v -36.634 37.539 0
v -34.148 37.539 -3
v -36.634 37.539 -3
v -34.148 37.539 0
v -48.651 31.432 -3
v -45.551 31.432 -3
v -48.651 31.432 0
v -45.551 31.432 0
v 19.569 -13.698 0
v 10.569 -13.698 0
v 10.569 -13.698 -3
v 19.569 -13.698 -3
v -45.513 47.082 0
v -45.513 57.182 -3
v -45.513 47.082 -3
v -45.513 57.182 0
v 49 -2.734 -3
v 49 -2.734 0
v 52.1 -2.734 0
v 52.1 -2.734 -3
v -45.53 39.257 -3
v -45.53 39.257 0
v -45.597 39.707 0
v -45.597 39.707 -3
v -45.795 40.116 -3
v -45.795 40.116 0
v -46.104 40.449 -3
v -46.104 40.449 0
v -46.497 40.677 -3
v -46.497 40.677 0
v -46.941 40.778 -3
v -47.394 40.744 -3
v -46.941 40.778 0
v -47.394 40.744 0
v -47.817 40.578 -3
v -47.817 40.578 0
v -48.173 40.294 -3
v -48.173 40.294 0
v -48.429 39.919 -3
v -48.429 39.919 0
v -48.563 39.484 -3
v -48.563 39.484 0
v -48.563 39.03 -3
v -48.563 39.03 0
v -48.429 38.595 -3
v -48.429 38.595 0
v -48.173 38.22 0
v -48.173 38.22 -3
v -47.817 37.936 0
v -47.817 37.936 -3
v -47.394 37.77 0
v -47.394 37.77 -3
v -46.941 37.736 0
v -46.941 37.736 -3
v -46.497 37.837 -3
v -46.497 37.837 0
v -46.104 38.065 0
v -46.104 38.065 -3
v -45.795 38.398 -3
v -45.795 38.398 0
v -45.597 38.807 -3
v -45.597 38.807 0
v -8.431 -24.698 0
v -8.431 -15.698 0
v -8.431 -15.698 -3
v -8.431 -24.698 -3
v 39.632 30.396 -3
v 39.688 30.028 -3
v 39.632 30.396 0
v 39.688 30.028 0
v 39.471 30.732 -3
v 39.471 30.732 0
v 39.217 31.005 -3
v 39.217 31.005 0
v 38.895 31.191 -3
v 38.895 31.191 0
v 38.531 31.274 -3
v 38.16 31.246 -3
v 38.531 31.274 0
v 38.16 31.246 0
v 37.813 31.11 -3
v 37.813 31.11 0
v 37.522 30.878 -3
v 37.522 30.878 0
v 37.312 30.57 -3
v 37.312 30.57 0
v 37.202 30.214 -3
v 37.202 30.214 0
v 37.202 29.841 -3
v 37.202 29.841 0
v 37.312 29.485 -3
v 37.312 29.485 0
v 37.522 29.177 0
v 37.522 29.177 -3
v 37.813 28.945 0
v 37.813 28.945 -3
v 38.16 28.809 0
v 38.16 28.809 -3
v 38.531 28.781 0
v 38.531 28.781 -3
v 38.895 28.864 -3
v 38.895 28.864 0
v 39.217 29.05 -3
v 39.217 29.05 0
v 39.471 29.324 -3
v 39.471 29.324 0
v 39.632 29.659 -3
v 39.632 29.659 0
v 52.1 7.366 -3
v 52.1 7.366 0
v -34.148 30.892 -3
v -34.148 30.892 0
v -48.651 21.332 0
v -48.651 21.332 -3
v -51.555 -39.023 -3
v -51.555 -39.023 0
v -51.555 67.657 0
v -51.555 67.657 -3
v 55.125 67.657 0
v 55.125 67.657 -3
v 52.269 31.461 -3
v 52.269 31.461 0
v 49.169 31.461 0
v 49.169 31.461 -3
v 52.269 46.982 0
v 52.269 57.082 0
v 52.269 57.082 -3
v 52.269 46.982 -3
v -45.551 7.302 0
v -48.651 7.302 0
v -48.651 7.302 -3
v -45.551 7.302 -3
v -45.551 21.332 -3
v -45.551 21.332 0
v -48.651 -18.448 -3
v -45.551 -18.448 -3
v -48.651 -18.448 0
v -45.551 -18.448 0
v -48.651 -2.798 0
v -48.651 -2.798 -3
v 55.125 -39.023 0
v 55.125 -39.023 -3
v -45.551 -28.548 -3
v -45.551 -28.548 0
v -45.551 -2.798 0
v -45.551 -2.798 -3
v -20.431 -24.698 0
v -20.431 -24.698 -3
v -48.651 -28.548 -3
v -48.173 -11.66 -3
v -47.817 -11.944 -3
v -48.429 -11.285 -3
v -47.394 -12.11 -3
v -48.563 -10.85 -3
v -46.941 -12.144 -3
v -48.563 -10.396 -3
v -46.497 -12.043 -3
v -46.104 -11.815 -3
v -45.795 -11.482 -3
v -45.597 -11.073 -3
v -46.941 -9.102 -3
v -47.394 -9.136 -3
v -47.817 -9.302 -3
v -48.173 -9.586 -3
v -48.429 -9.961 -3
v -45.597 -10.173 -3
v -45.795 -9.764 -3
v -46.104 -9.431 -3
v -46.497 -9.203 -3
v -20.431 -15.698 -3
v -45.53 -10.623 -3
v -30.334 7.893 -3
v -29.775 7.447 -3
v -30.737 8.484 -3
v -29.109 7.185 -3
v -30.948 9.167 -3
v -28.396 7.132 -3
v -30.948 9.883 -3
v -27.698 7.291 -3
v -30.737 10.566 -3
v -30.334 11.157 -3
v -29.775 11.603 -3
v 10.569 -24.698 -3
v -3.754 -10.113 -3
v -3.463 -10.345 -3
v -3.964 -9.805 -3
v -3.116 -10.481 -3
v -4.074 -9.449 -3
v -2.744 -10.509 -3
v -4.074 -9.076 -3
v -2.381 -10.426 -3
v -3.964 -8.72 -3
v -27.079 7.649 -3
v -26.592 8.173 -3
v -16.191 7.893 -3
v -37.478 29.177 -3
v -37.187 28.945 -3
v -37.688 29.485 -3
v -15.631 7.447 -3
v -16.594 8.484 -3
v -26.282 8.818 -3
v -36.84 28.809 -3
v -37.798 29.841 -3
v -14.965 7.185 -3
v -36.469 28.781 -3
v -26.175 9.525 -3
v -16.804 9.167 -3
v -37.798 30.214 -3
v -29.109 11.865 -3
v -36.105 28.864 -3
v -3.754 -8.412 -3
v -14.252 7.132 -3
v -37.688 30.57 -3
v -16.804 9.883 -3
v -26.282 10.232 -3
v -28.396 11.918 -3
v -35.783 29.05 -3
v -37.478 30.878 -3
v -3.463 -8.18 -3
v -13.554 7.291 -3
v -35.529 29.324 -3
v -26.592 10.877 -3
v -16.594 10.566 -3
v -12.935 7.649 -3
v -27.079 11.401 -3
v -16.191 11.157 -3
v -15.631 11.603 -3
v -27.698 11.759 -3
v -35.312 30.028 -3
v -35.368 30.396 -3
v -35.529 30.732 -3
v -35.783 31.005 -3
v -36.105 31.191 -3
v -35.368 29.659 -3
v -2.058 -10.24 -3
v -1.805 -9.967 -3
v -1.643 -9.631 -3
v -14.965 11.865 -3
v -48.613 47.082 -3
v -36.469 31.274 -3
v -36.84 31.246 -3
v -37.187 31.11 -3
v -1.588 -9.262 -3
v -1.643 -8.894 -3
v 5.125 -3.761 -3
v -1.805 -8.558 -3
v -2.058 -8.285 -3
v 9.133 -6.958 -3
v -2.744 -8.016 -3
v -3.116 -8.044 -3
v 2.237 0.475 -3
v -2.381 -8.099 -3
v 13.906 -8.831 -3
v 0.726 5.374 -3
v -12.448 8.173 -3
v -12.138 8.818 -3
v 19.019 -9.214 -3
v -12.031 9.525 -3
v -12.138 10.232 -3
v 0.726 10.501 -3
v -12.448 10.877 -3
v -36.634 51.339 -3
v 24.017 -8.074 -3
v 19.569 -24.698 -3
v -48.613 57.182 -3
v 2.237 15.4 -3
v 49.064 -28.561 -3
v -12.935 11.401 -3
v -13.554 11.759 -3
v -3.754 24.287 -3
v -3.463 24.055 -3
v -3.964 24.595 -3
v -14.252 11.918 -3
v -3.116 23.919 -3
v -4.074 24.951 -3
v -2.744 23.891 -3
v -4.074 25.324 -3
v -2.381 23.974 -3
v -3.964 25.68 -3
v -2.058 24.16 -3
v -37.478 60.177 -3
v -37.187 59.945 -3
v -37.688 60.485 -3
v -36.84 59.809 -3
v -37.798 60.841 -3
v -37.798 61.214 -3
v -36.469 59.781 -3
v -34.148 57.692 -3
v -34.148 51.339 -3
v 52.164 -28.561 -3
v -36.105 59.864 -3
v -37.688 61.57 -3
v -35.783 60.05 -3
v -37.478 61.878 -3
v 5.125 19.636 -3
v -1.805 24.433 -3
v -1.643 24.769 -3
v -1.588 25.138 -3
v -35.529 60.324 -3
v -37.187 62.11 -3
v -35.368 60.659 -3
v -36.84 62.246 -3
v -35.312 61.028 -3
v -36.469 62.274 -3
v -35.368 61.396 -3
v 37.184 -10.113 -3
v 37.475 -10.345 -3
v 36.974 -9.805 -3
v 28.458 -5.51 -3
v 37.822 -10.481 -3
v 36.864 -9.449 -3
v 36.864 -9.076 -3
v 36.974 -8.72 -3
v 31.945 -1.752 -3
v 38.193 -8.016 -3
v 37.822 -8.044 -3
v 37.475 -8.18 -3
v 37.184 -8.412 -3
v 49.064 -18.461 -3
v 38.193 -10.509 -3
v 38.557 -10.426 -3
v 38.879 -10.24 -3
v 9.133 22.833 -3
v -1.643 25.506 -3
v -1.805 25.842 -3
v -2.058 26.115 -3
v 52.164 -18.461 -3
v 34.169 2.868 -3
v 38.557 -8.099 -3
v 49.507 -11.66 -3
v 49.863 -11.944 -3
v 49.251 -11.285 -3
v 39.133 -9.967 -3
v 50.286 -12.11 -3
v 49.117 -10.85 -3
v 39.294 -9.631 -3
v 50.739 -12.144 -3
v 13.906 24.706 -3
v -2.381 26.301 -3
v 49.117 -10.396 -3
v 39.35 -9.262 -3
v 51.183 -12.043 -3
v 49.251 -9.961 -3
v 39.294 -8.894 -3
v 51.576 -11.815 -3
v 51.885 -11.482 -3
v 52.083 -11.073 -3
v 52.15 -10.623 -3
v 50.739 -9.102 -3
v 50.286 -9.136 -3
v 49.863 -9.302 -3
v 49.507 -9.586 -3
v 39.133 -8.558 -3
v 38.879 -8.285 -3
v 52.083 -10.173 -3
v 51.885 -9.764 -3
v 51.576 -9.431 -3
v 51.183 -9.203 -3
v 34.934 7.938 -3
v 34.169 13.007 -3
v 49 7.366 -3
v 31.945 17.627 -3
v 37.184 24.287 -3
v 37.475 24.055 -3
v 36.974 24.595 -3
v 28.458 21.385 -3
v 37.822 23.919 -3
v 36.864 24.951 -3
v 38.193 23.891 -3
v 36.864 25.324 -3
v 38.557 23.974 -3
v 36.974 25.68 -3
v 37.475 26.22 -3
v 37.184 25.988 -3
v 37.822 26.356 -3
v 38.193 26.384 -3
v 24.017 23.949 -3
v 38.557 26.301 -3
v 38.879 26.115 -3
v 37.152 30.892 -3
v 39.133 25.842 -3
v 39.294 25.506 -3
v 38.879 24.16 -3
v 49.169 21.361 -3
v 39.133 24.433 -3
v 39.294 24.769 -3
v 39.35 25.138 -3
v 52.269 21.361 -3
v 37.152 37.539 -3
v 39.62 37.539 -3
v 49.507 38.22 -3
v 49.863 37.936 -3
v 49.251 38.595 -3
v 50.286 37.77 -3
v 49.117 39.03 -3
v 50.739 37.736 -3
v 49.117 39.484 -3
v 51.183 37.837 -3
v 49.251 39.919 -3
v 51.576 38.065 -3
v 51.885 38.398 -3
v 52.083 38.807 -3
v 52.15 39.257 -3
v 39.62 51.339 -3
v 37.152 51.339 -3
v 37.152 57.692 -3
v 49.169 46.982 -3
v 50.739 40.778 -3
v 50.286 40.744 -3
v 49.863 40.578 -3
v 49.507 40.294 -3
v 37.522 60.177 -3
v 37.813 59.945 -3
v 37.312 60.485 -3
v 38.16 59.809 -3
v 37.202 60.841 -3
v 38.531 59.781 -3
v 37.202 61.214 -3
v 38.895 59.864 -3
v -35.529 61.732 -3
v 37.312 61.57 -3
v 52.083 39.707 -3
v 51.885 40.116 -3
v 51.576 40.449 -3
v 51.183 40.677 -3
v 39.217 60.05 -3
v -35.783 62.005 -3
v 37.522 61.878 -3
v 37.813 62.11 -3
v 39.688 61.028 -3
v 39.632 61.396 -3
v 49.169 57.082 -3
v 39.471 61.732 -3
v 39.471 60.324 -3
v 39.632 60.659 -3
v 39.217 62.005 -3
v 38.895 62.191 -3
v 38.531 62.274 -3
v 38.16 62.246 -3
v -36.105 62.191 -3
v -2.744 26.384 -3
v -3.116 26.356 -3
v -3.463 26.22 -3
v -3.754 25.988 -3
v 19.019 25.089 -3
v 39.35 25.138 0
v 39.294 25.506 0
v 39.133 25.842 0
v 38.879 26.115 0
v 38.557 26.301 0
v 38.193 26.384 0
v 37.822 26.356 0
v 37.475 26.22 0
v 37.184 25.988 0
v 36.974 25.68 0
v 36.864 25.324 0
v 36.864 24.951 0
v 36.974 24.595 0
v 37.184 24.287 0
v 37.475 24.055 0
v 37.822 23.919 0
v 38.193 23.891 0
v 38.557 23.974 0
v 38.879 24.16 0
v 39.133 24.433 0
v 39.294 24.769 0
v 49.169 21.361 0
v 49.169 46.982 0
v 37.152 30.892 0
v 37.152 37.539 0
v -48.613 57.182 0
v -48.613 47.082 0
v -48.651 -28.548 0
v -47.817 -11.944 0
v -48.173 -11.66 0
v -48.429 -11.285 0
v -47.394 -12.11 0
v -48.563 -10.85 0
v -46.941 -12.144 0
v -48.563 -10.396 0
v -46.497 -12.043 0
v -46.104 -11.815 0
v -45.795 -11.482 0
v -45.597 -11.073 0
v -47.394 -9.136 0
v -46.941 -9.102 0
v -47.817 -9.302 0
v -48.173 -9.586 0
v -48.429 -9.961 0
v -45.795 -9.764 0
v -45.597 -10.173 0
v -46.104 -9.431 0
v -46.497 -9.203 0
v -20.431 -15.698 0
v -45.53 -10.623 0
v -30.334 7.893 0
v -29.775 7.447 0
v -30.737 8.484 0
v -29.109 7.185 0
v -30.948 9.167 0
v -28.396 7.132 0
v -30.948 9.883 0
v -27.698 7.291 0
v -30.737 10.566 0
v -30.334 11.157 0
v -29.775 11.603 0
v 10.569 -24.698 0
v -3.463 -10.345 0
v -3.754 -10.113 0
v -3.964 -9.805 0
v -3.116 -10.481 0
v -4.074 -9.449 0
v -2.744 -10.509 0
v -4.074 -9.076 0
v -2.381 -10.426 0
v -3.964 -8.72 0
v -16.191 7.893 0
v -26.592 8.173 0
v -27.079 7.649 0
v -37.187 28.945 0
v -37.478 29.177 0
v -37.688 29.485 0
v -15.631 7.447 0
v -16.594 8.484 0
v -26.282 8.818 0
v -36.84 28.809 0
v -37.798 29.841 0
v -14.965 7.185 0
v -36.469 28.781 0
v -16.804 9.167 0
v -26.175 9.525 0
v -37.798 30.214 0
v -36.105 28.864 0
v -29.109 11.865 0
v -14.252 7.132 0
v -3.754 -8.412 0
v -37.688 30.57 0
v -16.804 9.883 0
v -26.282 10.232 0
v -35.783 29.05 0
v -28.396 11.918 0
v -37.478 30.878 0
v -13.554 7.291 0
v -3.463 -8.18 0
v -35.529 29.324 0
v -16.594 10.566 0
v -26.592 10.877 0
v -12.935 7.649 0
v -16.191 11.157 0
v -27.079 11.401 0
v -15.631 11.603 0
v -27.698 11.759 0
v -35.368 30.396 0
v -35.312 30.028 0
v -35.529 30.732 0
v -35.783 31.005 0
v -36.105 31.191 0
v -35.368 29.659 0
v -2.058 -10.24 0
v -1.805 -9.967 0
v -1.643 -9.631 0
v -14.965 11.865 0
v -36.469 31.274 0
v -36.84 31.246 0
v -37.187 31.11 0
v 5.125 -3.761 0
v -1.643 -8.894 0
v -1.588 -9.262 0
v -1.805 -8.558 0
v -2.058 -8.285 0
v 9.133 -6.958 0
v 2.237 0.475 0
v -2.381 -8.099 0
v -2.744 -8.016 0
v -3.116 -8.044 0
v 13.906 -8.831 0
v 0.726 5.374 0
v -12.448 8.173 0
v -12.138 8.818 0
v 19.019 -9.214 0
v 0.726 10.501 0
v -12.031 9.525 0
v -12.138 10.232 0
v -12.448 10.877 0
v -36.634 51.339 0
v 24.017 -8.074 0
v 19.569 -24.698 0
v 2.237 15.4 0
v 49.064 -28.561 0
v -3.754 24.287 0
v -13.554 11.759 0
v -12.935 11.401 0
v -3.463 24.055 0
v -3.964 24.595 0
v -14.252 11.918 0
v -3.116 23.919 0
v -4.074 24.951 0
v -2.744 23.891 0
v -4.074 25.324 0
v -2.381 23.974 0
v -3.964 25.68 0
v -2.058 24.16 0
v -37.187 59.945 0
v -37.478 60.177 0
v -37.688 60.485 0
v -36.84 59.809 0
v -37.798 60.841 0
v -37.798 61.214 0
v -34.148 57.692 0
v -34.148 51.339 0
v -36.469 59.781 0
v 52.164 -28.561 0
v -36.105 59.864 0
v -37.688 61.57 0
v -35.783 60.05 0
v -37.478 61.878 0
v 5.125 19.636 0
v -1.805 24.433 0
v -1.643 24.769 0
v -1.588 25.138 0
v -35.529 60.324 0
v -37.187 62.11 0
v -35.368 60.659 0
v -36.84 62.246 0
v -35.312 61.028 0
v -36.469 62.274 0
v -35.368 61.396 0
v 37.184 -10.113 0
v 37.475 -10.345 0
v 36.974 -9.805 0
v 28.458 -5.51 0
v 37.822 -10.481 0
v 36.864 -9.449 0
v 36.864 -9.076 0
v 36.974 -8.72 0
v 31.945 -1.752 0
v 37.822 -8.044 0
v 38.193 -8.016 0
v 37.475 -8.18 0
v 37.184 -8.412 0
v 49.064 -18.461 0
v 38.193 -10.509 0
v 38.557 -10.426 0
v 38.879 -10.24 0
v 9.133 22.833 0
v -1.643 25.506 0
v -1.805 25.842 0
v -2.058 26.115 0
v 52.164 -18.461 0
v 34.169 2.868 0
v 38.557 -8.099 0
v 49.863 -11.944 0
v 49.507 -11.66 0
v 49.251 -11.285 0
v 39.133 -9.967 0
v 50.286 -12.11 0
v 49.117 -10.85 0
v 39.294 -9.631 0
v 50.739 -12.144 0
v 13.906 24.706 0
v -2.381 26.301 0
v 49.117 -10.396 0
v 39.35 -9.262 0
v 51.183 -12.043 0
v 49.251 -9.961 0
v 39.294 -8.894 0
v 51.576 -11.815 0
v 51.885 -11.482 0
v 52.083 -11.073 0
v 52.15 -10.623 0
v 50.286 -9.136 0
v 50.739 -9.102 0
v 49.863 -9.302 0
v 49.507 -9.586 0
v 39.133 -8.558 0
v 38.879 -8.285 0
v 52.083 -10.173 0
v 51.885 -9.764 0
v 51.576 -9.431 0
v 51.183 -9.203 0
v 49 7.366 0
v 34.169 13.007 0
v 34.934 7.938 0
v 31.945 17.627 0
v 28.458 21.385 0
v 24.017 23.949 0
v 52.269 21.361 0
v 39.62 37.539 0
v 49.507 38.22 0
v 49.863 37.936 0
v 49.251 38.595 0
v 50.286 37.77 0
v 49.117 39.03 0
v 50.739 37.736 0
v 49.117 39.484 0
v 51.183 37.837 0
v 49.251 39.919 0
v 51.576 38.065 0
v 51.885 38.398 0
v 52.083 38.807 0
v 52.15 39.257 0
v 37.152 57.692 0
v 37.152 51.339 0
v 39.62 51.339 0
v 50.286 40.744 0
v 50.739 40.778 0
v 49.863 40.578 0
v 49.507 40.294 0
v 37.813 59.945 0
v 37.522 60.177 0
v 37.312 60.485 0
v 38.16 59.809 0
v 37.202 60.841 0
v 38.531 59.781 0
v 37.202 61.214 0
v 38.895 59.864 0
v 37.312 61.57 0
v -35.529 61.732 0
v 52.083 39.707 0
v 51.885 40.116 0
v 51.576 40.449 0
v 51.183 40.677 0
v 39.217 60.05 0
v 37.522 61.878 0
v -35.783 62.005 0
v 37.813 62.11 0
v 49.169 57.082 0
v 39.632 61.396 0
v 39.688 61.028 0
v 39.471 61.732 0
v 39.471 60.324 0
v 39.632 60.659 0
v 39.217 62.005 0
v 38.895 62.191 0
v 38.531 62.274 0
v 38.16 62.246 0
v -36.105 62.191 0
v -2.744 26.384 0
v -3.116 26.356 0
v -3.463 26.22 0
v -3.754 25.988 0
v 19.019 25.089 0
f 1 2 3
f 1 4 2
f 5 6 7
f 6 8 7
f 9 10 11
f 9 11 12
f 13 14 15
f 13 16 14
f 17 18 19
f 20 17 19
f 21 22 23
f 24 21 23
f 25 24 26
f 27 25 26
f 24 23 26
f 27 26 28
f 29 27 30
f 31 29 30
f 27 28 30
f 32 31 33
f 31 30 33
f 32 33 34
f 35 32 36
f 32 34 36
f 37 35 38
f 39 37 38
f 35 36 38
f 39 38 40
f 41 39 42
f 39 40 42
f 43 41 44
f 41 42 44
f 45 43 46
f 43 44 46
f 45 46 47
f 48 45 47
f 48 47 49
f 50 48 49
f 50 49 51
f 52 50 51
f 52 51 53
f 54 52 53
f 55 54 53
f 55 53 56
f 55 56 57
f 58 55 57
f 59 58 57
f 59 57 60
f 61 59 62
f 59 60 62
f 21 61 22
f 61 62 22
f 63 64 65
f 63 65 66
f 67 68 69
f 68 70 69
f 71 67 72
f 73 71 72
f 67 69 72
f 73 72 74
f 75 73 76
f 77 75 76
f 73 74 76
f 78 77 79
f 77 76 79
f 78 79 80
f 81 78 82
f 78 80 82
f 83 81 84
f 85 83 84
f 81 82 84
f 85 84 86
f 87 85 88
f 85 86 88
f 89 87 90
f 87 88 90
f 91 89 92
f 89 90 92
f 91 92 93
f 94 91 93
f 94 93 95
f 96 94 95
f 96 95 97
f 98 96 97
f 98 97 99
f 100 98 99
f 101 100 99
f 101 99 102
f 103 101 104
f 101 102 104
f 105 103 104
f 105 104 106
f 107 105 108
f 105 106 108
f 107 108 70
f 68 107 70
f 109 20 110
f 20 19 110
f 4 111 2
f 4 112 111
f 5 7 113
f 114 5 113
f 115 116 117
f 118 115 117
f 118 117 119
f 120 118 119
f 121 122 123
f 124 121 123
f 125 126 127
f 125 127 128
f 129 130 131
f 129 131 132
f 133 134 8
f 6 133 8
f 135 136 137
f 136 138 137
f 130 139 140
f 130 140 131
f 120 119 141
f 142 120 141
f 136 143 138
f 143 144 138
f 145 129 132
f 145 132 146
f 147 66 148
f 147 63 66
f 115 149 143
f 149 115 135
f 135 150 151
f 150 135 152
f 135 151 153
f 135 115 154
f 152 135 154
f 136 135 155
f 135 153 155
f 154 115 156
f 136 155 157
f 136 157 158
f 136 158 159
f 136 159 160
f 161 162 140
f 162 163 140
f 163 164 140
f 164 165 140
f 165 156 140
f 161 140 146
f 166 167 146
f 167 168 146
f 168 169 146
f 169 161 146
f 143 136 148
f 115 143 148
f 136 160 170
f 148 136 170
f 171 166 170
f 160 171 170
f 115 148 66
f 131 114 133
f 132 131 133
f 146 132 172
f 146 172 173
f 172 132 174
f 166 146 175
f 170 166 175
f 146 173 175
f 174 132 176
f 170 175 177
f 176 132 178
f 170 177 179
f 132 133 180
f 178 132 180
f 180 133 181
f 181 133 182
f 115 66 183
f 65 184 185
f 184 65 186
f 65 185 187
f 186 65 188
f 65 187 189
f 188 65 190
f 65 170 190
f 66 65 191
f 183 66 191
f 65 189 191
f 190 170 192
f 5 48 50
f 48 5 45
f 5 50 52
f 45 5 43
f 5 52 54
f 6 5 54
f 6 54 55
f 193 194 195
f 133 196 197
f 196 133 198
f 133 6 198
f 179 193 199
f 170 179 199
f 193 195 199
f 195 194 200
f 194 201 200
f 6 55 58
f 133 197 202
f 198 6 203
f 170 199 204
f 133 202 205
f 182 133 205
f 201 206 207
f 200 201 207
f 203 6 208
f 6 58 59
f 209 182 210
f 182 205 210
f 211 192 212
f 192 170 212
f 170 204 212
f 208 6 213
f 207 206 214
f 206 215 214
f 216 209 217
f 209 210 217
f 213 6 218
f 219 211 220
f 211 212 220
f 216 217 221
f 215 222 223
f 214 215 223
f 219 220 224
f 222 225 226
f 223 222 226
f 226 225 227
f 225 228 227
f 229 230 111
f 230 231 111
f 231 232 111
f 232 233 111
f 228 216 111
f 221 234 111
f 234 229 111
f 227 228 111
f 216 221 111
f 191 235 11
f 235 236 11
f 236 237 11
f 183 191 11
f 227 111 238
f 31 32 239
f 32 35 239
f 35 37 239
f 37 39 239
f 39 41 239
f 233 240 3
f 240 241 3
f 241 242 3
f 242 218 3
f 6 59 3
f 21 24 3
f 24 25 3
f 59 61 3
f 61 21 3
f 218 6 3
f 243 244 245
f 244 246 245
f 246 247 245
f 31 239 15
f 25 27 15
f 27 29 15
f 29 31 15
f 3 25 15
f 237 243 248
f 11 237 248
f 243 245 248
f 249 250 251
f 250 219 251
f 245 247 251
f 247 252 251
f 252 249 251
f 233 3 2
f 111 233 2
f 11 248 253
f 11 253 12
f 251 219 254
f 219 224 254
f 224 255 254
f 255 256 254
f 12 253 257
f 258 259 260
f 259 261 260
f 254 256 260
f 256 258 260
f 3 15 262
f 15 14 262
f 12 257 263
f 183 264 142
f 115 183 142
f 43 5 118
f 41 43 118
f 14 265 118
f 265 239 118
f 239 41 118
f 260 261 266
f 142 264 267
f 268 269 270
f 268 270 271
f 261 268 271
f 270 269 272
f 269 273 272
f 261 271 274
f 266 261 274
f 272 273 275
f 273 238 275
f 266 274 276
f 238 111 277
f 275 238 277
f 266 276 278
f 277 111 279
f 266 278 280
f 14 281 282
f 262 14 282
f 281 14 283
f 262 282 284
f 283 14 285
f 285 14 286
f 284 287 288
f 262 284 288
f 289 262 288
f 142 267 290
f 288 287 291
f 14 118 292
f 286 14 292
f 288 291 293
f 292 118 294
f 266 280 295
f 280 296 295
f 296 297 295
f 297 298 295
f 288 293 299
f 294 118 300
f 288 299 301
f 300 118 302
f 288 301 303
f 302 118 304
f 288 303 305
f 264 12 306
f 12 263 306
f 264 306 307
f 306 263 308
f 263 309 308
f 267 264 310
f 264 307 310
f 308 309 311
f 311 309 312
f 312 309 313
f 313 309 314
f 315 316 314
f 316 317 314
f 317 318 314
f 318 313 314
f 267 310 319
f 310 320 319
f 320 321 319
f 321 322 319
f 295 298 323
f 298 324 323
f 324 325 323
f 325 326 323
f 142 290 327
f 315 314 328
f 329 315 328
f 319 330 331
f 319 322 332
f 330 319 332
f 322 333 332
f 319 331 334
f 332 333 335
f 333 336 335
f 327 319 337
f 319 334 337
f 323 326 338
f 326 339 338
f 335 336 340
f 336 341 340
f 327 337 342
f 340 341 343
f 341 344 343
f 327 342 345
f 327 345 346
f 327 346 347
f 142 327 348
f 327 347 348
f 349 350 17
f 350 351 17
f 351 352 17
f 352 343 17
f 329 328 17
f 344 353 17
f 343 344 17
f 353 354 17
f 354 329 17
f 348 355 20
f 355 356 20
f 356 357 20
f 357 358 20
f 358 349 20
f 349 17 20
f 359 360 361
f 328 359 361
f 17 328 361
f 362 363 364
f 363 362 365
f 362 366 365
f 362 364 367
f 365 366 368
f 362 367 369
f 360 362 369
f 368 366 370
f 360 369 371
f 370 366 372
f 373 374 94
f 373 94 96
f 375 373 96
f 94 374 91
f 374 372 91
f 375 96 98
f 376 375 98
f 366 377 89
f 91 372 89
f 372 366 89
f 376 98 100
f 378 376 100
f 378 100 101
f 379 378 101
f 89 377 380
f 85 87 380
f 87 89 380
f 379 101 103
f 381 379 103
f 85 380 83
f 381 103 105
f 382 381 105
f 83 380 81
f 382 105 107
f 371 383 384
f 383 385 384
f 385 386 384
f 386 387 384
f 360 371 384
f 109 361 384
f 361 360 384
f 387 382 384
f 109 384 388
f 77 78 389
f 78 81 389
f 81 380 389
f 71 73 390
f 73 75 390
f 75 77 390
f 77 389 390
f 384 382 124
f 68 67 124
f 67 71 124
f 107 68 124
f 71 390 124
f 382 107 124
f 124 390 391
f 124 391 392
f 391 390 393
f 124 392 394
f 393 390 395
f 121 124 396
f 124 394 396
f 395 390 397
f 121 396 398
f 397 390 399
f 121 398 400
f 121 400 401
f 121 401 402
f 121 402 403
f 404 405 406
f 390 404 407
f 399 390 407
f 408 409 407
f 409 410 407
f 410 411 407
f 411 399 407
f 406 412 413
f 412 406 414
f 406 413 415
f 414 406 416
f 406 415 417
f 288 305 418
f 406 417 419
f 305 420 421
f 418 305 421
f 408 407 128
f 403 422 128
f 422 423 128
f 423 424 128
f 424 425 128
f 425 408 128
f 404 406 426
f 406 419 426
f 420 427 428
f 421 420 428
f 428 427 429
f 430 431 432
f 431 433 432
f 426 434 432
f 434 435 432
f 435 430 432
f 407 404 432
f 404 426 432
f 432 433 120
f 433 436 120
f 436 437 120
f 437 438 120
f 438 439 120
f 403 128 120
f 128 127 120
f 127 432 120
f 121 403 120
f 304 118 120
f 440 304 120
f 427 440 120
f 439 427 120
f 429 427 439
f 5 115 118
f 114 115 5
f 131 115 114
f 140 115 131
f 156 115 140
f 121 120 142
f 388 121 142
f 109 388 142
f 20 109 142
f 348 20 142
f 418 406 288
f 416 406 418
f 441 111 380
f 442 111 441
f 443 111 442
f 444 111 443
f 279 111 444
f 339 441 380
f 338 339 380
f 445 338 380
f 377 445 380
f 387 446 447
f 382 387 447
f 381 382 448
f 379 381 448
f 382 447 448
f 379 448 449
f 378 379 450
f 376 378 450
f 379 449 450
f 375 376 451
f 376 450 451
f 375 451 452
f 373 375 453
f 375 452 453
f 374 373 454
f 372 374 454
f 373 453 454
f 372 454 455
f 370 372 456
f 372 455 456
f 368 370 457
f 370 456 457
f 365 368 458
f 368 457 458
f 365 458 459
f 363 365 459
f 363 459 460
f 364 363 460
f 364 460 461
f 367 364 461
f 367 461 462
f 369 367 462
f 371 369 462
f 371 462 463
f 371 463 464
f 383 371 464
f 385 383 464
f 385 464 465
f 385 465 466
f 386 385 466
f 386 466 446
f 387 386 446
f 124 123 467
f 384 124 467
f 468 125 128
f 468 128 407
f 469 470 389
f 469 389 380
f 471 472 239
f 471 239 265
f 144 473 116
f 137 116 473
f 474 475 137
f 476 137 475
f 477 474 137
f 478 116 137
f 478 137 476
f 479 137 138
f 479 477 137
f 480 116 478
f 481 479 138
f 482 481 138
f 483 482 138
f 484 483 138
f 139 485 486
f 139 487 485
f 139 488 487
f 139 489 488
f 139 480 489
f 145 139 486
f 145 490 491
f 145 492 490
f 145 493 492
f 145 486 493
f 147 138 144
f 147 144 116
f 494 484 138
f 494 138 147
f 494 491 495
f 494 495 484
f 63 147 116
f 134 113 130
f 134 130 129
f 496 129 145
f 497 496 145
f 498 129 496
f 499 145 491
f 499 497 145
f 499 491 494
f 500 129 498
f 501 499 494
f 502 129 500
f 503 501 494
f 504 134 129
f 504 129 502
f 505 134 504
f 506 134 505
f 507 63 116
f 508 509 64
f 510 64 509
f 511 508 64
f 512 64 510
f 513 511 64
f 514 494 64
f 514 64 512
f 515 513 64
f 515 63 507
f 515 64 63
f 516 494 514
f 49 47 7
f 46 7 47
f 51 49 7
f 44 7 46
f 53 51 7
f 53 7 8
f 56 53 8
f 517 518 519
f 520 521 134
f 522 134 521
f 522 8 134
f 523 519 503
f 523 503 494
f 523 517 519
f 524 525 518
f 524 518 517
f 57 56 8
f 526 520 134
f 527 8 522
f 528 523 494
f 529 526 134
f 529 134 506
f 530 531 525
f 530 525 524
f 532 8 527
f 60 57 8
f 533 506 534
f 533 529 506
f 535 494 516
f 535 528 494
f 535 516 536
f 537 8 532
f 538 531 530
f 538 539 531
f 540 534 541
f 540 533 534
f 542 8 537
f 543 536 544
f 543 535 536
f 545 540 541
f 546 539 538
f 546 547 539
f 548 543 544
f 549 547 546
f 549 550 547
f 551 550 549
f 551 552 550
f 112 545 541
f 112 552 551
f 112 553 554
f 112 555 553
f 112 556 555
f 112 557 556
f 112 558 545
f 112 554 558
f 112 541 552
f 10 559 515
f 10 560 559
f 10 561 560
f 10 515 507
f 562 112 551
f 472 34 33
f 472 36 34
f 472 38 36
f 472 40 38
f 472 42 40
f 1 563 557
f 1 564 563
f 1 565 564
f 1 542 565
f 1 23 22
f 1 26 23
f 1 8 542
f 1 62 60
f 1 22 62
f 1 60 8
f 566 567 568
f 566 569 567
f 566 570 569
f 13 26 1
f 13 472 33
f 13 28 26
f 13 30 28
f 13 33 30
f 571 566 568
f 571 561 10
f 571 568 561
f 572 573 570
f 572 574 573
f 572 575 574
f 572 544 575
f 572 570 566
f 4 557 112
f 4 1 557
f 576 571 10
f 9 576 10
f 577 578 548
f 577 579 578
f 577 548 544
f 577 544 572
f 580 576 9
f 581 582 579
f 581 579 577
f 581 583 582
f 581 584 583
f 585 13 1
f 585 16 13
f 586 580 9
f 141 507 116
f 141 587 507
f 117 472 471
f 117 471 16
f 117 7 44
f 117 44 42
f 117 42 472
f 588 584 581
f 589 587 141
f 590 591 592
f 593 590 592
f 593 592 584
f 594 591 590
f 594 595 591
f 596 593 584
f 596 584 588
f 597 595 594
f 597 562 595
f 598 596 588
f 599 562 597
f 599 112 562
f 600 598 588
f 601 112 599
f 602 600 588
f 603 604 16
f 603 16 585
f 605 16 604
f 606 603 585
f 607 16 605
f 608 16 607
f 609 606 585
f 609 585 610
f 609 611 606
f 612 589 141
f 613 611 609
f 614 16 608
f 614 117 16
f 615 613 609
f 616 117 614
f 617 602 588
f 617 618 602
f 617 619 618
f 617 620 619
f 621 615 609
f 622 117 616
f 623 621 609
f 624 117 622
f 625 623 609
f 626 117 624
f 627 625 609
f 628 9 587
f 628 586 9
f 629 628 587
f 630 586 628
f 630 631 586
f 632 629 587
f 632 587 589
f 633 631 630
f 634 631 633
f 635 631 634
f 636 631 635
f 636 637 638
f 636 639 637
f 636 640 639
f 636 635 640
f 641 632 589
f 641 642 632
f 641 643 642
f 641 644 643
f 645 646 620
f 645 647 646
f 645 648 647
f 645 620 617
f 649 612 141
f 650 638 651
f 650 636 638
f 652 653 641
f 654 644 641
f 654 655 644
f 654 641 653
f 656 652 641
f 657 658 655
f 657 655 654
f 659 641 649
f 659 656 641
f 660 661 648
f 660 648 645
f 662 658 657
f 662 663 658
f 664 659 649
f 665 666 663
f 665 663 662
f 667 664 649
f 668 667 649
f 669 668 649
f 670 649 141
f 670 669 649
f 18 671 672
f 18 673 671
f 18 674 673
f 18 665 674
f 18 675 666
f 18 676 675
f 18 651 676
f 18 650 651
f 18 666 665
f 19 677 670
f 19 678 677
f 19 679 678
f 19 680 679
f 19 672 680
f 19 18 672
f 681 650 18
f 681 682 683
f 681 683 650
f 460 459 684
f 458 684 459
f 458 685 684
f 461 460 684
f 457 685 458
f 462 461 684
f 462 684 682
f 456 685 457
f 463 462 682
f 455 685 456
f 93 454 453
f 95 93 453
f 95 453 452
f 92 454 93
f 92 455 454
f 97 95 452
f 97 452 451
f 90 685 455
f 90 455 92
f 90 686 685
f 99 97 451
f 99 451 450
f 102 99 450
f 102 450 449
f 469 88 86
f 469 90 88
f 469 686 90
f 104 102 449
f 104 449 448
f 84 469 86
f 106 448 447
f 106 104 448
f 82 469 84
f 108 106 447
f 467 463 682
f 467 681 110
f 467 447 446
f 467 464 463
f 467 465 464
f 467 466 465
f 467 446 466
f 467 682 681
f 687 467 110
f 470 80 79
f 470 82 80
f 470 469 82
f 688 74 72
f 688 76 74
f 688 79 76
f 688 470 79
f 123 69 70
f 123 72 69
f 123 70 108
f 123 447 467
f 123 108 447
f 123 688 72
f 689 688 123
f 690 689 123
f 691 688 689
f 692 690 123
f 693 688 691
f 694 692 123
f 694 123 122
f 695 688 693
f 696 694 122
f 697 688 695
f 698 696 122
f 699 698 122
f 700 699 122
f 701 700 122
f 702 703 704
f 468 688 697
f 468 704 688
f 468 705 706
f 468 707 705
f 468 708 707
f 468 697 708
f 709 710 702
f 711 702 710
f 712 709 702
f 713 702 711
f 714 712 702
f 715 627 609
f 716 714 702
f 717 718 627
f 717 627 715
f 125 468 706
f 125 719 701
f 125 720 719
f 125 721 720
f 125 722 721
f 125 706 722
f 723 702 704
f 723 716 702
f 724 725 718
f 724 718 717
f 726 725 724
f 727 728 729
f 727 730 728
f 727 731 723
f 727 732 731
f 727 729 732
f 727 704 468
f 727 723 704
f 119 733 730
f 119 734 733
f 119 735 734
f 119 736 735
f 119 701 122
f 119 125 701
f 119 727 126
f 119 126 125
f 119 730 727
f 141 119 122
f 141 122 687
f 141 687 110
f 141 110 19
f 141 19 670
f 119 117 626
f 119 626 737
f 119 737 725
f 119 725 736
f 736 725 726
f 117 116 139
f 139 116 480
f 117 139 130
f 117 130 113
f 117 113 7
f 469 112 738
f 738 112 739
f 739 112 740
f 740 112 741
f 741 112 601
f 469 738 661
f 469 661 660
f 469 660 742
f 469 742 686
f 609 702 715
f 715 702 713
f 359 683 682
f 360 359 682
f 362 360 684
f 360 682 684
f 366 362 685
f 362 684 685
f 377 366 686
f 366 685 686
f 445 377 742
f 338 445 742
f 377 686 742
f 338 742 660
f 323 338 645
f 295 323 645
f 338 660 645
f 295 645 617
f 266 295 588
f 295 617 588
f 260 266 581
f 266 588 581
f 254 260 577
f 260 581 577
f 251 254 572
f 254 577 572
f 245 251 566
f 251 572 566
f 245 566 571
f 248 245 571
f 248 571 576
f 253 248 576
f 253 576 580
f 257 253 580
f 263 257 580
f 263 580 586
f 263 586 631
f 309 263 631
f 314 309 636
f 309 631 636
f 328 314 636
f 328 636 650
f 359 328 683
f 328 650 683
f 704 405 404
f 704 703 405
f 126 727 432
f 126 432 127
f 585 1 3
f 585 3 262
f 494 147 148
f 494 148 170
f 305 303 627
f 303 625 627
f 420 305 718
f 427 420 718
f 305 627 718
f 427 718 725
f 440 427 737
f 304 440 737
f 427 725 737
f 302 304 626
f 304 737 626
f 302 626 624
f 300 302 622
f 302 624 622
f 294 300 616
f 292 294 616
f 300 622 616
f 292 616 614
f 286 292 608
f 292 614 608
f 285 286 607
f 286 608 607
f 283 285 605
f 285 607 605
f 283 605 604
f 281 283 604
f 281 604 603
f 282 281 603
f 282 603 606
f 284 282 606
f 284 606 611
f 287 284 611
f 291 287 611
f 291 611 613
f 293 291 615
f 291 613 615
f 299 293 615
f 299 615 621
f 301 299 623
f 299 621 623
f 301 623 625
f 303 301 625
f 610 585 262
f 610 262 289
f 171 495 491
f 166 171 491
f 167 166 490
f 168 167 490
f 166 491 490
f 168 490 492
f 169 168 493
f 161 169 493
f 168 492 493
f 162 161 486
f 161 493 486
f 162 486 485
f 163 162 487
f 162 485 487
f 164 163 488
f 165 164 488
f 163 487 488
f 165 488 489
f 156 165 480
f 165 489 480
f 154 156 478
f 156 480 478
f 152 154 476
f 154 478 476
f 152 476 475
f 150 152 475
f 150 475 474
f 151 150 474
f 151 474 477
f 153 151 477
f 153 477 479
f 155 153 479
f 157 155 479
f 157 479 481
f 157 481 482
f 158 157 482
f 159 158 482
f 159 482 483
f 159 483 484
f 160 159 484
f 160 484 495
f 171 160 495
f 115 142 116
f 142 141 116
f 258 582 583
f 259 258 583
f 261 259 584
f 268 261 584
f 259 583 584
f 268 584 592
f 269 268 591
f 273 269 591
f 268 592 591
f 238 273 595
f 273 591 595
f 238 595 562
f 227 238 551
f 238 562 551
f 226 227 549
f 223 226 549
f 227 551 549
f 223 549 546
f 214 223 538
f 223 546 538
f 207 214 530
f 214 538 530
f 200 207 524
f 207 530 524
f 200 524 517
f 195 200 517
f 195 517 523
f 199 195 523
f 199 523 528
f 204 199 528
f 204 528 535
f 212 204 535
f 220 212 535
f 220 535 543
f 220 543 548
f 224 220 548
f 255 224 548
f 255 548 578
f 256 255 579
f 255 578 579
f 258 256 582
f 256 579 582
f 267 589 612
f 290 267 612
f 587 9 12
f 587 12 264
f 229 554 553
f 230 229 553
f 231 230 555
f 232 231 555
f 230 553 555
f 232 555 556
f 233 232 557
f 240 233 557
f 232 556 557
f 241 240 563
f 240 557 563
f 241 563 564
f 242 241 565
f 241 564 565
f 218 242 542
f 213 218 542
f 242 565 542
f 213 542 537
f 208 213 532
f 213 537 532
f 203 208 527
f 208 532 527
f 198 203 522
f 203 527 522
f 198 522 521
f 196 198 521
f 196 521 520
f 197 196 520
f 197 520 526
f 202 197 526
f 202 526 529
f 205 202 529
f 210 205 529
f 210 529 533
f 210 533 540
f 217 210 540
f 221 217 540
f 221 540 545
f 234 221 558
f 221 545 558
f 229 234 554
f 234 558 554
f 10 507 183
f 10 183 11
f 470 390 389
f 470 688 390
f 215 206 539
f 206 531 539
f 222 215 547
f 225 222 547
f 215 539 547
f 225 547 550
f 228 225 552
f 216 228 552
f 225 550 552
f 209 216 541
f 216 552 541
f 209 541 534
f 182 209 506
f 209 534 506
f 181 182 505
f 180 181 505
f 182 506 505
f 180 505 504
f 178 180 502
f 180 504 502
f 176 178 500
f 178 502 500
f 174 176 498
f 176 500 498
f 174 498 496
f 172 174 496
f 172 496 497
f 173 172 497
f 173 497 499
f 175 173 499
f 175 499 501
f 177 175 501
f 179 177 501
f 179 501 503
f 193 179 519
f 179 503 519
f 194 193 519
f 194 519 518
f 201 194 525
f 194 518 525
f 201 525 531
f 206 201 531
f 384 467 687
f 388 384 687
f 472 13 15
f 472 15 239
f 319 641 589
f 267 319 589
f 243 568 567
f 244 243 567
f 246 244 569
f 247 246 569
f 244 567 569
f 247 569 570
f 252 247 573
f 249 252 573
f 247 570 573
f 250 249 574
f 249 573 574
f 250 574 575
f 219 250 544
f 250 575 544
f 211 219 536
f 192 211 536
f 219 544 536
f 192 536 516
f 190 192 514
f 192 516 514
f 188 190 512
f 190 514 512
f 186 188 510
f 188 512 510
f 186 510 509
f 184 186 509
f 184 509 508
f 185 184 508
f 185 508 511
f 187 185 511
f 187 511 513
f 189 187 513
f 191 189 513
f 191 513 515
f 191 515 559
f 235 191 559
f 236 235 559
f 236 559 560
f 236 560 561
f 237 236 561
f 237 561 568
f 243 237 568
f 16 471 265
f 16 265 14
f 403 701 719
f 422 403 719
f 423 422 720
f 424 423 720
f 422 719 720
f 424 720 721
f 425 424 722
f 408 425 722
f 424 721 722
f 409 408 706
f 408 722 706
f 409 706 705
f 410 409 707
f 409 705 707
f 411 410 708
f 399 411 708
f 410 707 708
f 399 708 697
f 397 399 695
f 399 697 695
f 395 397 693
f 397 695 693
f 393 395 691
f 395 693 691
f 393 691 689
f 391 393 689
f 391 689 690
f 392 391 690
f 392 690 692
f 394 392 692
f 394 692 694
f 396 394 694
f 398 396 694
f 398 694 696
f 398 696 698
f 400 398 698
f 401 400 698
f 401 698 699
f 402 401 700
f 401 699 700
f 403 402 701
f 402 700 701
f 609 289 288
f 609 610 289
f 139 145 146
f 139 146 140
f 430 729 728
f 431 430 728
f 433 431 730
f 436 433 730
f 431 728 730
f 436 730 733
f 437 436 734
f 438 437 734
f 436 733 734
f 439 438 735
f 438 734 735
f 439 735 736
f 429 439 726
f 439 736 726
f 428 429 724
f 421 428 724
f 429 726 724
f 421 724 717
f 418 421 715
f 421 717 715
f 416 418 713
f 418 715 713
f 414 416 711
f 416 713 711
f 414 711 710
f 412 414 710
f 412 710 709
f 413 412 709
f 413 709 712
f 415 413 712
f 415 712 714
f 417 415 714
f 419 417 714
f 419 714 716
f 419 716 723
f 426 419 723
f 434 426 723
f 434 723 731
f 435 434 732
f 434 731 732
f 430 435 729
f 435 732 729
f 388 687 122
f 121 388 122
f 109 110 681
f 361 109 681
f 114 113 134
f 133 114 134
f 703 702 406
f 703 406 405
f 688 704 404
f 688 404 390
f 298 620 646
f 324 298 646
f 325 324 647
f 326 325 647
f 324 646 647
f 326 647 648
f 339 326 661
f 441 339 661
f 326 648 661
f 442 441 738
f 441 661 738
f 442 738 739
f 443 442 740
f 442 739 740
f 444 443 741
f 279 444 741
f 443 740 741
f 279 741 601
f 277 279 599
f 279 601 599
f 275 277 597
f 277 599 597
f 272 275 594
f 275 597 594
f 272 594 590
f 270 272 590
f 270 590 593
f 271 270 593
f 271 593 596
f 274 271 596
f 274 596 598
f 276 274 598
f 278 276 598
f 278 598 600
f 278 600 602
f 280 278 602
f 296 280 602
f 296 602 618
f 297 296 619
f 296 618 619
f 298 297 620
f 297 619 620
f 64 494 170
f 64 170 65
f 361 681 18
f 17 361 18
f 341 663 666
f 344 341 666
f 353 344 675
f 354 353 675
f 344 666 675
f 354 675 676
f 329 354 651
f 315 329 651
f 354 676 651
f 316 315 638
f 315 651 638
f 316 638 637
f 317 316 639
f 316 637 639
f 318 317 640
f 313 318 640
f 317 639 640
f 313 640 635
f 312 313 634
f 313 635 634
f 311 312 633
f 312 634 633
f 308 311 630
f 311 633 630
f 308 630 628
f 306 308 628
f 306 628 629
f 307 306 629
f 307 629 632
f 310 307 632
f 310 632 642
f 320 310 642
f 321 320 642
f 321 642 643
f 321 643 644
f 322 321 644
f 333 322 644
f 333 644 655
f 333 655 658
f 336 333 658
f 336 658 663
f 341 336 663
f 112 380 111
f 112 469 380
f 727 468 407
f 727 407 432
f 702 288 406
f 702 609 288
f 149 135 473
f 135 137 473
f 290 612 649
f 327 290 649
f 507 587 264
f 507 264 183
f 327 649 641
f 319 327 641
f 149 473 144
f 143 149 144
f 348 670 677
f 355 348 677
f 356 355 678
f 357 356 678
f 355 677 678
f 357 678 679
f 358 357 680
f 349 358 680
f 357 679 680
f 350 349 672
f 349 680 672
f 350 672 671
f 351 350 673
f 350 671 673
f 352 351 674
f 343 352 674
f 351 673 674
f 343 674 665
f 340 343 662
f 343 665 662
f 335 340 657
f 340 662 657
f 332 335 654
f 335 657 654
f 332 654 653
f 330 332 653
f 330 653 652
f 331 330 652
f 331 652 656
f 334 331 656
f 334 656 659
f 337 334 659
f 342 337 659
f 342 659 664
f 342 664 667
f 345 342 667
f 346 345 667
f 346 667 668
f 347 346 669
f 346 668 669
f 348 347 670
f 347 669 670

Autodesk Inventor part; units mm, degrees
ref_plane "YZ Plane" through (0, 0, 0) normal (1, 0, 0) x (0, 1, 0)
ref_plane "XZ Plane" through (0, 0, 0) normal (0, 1, 0) x (-1, 0, 0)
ref_plane "XY Plane" through (0, 0, 0) normal (0, 0, 1) x (1, 0, 0)
sketch "Sketch1" plane through (0, 0, 0) normal (0, 0, 1) x (1, 0, 0)
  line L0 (-51.5546, 67.657) -> (55.1254, 67.657)
  line L1 (55.1254, 67.657) -> (55.1254, -39.023)
  line L2 (55.1254, -39.023) -> (-51.5546, -39.023)
  line L3 (-51.5546, -39.023) -> (-51.5546, 67.657)
  dimension "d0" = 106.68
  dimension "d2" = 106.68
extrude "Extrusion1" add sketch "Sketch1" against normal blind 3
sketch "LCD Cut Out" plane through (0, 0, 0) normal (0, 0, 1) x (1, 0, 0)
  circle A0 centre (-36.5621, 61.0277) radius 1.25
  circle A1 centre (-36.5621, 30.0277) radius 1.25
  circle A2 centre (38.4379, 61.0277) radius 1.25
  circle A3 centre (38.4379, 30.0277) radius 1.25
  line L0 (-34.1482, 57.6923) -> (37.1518, 57.6923)
  line L1 (37.1518, 57.6923) -> (37.1518, 30.8923)
  line L2 (37.1518, 30.8923) -> (-34.1482, 30.8923)
  line L3 (-34.1482, 30.8923) -> (-34.1482, 57.6923)
  line L4 (37.1196, 51.3389) -> (39.6196, 51.3389)
  line L5 (39.6196, 51.3389) -> (39.6196, 37.5389)
  line L6 (39.6196, 37.5389) -> (37.1196, 37.5389)
  line L7 (37.1196, 37.5389) -> (37.1196, 51.3389)
  line L8 (-36.6336, 51.3389) -> (-34.1336, 51.3389)
  line L9 (-34.1336, 51.3389) -> (-34.1336, 37.5389)
  line L10 (-34.1336, 37.5389) -> (-36.6336, 37.5389)
  line L11 (-36.6336, 37.5389) -> (-36.6336, 51.3389)
  point P0 (0, 0)
  dimension "d96" = 76.2532
sketch "Sketch9" plane through (0, 0, 0) normal (0, 0, 1) x (1, 0, 0)
  circle A0 centre (-14.4313, 9.525) radius 2.4
  circle A1 centre (-28.575, 9.525) radius 2.4
  circle A2 centre (17.7335, 7.9375) radius 17.2
  circle A3 centre (-2.8375, 25.1375) radius 1.25
  circle A4 centre (38.1, 25.1375) radius 1.25
  circle A5 centre (38.1, -9.2625) radius 1.25
  circle A6 centre (-2.8375, -9.2625) radius 1.25
  line L0 (-20.4313, -15.698) -> (-8.4313, -15.698)
  line L1 (-8.4313, -15.698) -> (-8.4313, -24.698)
  line L2 (-8.4313, -24.698) -> (-20.4313, -24.698)
  line L3 (-20.4313, -24.698) -> (-20.4313, -15.698)
  line L4 (10.5687, -13.698) -> (19.5687, -13.698)
  line L5 (19.5687, -13.698) -> (19.5687, -24.698)
  line L6 (19.5687, -24.698) -> (10.5687, -24.698)
  line L7 (10.5687, -24.698) -> (10.5687, -13.698)
  line L8 (-51.5546, 67.657) -> (55.1254, 67.657) projected
  line L9 (55.1254, -39.023) -> (-51.5546, -39.023) projected
  line L10 (55.1254, 67.657) -> (55.1254, -39.023) projected
  circle A7 centre (-47.0546, 39.257) radius 1.525
  circle A8 centre (-47.0546, -10.623) radius 1.525
  circle A9 centre (50.6254, 39.257) radius 1.525
  circle A10 centre (50.6254, -10.623) radius 1.525
  line L11 (-48.6128, 57.182) -> (-45.5128, 57.182)
  line L12 (-45.5128, 57.182) -> (-45.5128, 47.082)
  line L13 (-45.5128, 47.082) -> (-48.6128, 47.082)
  line L14 (-48.6128, 47.082) -> (-48.6128, 57.182)
  line L15 (-45.5506, 31.432) -> (-48.6506, 31.432)
  line L16 (-48.6506, 31.432) -> (-48.6506, 21.332)
  line L17 (-48.6506, 21.332) -> (-45.5506, 21.332)
  line L18 (-45.5506, 21.332) -> (-45.5506, 31.432)
  line L19 (-45.5506, -2.798) -> (-48.6506, -2.798)
  line L20 (-48.6506, -2.798) -> (-48.6506, 7.302)
  line L21 (-48.6506, 7.302) -> (-45.5506, 7.302)
  line L22 (-45.5506, 7.302) -> (-45.5506, -2.798)
  line L23 (-45.5506, -18.448) -> (-48.6506, -18.448)
  line L24 (-48.6506, -18.448) -> (-48.6506, -28.548)
  line L25 (-48.6506, -28.548) -> (-45.5506, -28.548)
  line L26 (-45.5506, -28.548) -> (-45.5506, -18.448)
  line L27 (52.0999, 7.3659) -> (48.9999, 7.3659)
  line L28 (48.9999, 7.3659) -> (48.9999, -2.7341)
  line L29 (48.9999, -2.7341) -> (52.0999, -2.7341)
  line L30 (52.0999, -2.7341) -> (52.0999, 7.3659)
  line L31 (52.1638, -18.4611) -> (49.0638, -18.4611)
  line L32 (49.0638, -18.4611) -> (49.0638, -28.5611)
  line L33 (49.0638, -28.5611) -> (52.1638, -28.5611)
  line L34 (52.1638, -28.5611) -> (52.1638, -18.4611)
  line L35 (52.2687, 46.9823) -> (49.1687, 46.9823)
  line L36 (49.1687, 46.9823) -> (49.1687, 57.0823)
  line L37 (49.1687, 57.0823) -> (52.2687, 57.0823)
  line L38 (52.2687, 57.0823) -> (52.2687, 46.9823)
  line L39 (52.2687, 31.4608) -> (49.1687, 31.4608)
  line L40 (49.1687, 31.4608) -> (49.1687, 21.3608)
  line L41 (49.1687, 21.3608) -> (52.2687, 21.3608)
  line L42 (52.2687, 21.3608) -> (52.2687, 31.4608)
  point P0 (0, 0)
  dimension "d56" = 4.8
  dimension "d57" = 4.8
  dimension "d60" = 34.4
  dimension "d62" = 2.5
  dimension "d63" = 2.5
  dimension "d64" = 2.5
  dimension "d65" = 2.5
  dimension "d66" = 12
  dimension "d67" = 9
  dimension "d69" = 9
  dimension "d70" = 11
  dimension "d72" = 40
  dimension "d88" = 3.05
  dimension "d89" = 28.4
  dimension "d91" = 3.05
  dimension "d92" = 28.4
  dimension "d93" = 3.05
  dimension "d95" = 3.05
  dimension "d98" = 3.1
  dimension "d99" = 10.1
  dimension "d100" = 3.1
  dimension "d101" = 10.1
  dimension "d102" = 6.3
  dimension "d103" = 6.3
  dimension "d104" = 3.1
  dimension "d105" = 10.1
  dimension "d106" = 3.1
  dimension "d107" = 10.1
  dimension "d108" = 6.3
  dimension "d109" = 6.3
  dimension "d110" = 3.1
  dimension "d111" = 10.1
  dimension "d112" = 3.1
  dimension "d113" = 10.1
  dimension "d117" = 4.5
  dimension "d120" = 3.1
  dimension "d121" = 10.1
  dimension "d122" = 3.1
  dimension "d123" = 10.1
  dimension "d126" = 14.325
  dimension "d127" = 14.325
extrude "Extrusion4" cut sketch "Sketch9" against normal blind 28.4
extrude "Extrusion5" cut sketch "LCD Cut Out" against normal blind 3
equation "\"d75\" = d89"
properties part number "open reflow box"
